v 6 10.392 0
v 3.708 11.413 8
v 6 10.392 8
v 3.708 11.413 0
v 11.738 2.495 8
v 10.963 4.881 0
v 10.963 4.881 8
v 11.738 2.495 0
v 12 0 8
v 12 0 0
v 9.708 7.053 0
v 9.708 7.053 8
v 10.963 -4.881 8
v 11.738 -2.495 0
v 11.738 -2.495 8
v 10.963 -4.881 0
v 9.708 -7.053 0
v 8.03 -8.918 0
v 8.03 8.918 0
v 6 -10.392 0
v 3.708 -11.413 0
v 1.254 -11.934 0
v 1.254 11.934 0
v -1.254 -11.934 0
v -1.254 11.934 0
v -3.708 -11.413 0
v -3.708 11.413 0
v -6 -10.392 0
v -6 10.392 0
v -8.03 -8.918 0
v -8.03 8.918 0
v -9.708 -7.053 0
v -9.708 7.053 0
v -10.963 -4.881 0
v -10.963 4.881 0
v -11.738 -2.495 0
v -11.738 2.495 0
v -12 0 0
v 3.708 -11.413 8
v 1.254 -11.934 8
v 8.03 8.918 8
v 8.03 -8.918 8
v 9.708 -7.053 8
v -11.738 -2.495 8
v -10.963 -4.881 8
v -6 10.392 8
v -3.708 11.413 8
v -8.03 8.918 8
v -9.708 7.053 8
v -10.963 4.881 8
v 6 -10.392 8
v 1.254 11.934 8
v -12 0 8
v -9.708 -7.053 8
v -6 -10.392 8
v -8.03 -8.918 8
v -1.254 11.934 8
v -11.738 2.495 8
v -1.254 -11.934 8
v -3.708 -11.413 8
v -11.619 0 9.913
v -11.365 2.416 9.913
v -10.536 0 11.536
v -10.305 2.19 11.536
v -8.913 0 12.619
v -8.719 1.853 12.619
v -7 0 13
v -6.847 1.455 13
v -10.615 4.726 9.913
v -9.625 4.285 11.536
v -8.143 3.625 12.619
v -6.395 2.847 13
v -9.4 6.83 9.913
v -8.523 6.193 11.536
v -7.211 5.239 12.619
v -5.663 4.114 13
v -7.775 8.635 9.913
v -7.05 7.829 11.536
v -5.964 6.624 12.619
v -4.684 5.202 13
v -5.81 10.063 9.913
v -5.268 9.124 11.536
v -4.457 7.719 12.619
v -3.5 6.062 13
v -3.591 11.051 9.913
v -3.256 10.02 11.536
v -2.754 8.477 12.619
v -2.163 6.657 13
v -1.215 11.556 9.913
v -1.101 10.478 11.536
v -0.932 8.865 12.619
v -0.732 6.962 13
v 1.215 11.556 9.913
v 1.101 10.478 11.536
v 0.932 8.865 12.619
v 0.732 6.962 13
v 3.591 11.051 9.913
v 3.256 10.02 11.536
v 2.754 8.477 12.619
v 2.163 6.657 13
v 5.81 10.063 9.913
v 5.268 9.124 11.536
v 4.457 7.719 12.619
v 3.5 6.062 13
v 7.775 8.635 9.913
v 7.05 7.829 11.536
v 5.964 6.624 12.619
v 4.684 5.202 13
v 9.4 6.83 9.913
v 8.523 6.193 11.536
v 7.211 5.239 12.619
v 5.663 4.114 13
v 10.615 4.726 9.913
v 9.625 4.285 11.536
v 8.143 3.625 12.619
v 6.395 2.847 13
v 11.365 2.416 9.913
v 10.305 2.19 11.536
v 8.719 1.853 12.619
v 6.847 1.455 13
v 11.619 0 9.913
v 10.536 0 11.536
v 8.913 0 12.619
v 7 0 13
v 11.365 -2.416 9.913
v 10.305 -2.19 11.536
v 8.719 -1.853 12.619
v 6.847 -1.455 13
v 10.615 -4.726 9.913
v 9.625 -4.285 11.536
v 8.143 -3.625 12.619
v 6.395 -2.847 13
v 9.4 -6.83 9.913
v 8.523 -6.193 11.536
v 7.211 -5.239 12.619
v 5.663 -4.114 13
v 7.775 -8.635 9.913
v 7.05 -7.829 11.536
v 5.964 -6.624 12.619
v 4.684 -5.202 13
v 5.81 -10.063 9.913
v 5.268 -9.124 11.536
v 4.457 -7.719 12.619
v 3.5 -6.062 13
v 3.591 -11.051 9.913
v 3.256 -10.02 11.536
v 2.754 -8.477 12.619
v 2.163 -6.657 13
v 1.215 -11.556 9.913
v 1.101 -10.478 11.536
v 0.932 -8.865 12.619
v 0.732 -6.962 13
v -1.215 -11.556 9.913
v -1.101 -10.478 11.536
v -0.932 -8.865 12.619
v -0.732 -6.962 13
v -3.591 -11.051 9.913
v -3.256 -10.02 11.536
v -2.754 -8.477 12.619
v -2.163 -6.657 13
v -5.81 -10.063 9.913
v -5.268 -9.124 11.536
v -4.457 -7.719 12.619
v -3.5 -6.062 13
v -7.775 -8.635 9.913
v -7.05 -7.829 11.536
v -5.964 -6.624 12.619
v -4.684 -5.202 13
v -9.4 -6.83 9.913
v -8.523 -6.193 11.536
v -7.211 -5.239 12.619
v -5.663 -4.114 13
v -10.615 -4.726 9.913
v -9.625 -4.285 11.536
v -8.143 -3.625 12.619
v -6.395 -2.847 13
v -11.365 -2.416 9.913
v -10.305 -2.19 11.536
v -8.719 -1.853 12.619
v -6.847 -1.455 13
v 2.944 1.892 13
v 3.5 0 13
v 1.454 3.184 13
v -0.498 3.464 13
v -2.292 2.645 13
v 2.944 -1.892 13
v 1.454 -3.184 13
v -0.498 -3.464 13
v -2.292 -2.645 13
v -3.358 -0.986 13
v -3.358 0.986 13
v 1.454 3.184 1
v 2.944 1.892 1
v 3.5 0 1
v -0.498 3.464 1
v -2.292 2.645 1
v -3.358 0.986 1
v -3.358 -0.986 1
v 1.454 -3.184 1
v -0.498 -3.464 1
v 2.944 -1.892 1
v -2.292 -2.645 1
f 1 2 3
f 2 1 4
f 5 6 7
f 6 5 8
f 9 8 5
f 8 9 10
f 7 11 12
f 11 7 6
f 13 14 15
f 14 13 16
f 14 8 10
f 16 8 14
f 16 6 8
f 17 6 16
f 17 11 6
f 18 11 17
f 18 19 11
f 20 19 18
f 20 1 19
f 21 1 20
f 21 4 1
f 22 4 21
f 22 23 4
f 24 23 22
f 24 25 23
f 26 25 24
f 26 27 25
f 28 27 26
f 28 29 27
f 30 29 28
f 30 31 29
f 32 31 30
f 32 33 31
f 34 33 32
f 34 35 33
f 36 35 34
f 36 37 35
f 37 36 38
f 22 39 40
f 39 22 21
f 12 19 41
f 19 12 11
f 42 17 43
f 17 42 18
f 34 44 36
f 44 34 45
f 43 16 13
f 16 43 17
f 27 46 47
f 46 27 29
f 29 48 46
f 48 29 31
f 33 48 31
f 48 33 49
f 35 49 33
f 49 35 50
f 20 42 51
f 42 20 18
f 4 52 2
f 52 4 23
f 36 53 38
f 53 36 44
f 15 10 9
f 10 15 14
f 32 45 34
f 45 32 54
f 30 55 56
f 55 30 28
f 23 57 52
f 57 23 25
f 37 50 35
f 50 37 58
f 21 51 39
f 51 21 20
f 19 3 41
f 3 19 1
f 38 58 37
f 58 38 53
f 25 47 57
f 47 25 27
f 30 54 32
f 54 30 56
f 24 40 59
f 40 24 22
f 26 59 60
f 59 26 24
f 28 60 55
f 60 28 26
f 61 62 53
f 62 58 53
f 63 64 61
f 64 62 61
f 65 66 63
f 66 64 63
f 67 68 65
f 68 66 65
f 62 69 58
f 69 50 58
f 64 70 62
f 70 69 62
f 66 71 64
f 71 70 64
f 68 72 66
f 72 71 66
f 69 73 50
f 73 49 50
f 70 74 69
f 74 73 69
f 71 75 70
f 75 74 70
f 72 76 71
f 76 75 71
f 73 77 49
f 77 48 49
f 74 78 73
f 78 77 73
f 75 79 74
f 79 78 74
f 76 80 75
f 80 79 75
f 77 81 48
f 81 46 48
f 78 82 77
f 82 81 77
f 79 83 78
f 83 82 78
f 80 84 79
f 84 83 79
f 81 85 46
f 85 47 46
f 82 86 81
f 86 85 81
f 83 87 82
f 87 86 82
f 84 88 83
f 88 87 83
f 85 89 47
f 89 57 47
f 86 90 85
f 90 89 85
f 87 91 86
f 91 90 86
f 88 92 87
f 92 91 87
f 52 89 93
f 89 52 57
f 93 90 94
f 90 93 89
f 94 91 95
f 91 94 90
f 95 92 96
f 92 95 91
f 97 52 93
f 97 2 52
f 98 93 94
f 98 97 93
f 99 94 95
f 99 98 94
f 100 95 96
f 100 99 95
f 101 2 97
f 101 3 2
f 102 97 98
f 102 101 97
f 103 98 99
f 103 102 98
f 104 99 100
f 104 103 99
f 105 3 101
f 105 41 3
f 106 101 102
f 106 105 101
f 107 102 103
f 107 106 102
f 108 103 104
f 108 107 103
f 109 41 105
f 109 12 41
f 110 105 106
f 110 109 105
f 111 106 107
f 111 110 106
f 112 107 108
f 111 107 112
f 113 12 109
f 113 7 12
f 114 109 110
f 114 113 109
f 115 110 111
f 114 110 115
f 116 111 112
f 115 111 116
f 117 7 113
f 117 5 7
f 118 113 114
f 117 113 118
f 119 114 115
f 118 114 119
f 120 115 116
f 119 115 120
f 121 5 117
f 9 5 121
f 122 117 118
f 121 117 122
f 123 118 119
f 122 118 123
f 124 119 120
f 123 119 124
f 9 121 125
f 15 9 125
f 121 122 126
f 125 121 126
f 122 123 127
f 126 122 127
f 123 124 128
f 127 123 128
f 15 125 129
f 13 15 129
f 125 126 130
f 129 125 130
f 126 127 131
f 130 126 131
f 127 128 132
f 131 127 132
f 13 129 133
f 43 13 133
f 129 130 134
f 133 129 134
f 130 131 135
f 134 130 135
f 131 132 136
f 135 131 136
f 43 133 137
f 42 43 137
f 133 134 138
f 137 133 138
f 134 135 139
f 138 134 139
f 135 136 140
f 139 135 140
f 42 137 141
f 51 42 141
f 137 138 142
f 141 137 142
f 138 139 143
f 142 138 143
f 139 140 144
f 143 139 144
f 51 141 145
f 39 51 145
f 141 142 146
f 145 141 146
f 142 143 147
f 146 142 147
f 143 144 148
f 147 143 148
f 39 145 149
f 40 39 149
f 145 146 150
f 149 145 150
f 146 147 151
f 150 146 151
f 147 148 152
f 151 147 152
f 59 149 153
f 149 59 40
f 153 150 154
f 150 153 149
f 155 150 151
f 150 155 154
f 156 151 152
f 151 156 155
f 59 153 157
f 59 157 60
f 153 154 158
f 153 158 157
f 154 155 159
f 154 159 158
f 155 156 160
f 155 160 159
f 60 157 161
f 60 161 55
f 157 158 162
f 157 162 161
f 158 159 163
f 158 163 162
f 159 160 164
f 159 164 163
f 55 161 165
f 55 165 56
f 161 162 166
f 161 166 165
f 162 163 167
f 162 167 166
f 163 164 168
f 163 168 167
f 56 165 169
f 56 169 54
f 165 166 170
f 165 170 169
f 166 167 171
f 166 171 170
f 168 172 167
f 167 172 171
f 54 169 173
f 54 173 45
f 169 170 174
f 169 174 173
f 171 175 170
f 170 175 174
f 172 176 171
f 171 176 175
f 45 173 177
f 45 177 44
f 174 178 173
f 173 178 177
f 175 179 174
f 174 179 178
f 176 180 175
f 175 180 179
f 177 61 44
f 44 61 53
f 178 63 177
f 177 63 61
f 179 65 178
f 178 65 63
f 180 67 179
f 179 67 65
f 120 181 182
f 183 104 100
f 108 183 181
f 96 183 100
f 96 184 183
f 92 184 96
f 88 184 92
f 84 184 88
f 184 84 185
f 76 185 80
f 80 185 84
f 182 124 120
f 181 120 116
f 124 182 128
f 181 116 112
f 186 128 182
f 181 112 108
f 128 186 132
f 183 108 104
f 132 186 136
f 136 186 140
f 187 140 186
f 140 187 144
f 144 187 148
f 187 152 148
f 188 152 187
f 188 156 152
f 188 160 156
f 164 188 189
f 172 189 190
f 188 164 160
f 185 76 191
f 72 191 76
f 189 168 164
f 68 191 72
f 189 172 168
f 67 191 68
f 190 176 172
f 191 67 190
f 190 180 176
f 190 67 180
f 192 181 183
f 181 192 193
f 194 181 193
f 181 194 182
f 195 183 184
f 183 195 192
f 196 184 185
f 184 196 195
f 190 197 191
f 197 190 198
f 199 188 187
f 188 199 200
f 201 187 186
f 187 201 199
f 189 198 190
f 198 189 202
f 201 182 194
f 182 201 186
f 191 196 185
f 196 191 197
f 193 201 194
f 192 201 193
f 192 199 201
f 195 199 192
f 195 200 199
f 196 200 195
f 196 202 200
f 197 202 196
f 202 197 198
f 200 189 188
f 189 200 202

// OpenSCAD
foot_diameter = 24;
cutout_diameter = 7;
cutout_depth = 12;
inset_height = 8; // aproximated - not yet measured
exposed_height = 5;

module Cutout() {
    cylinder(h = cutout_depth + 0.01, d = cutout_diameter);
}

module FootForm() {
    flat_radius = foot_diameter / 2 - exposed_height;
    cylinder(h = inset_height, d = foot_diameter);
    rotate_extrude()
    translate([0, inset_height])
    union() {
        translate([flat_radius, 0]) circle(r = exposed_height);
        square([flat_radius, exposed_height]);
    }
    
}

module Foot() {
    bottom_thickness = inset_height + exposed_height - cutout_depth;
    difference() {
        FootForm();
        translate([0, 0, bottom_thickness]) Cutout();
    }
}

Foot();
